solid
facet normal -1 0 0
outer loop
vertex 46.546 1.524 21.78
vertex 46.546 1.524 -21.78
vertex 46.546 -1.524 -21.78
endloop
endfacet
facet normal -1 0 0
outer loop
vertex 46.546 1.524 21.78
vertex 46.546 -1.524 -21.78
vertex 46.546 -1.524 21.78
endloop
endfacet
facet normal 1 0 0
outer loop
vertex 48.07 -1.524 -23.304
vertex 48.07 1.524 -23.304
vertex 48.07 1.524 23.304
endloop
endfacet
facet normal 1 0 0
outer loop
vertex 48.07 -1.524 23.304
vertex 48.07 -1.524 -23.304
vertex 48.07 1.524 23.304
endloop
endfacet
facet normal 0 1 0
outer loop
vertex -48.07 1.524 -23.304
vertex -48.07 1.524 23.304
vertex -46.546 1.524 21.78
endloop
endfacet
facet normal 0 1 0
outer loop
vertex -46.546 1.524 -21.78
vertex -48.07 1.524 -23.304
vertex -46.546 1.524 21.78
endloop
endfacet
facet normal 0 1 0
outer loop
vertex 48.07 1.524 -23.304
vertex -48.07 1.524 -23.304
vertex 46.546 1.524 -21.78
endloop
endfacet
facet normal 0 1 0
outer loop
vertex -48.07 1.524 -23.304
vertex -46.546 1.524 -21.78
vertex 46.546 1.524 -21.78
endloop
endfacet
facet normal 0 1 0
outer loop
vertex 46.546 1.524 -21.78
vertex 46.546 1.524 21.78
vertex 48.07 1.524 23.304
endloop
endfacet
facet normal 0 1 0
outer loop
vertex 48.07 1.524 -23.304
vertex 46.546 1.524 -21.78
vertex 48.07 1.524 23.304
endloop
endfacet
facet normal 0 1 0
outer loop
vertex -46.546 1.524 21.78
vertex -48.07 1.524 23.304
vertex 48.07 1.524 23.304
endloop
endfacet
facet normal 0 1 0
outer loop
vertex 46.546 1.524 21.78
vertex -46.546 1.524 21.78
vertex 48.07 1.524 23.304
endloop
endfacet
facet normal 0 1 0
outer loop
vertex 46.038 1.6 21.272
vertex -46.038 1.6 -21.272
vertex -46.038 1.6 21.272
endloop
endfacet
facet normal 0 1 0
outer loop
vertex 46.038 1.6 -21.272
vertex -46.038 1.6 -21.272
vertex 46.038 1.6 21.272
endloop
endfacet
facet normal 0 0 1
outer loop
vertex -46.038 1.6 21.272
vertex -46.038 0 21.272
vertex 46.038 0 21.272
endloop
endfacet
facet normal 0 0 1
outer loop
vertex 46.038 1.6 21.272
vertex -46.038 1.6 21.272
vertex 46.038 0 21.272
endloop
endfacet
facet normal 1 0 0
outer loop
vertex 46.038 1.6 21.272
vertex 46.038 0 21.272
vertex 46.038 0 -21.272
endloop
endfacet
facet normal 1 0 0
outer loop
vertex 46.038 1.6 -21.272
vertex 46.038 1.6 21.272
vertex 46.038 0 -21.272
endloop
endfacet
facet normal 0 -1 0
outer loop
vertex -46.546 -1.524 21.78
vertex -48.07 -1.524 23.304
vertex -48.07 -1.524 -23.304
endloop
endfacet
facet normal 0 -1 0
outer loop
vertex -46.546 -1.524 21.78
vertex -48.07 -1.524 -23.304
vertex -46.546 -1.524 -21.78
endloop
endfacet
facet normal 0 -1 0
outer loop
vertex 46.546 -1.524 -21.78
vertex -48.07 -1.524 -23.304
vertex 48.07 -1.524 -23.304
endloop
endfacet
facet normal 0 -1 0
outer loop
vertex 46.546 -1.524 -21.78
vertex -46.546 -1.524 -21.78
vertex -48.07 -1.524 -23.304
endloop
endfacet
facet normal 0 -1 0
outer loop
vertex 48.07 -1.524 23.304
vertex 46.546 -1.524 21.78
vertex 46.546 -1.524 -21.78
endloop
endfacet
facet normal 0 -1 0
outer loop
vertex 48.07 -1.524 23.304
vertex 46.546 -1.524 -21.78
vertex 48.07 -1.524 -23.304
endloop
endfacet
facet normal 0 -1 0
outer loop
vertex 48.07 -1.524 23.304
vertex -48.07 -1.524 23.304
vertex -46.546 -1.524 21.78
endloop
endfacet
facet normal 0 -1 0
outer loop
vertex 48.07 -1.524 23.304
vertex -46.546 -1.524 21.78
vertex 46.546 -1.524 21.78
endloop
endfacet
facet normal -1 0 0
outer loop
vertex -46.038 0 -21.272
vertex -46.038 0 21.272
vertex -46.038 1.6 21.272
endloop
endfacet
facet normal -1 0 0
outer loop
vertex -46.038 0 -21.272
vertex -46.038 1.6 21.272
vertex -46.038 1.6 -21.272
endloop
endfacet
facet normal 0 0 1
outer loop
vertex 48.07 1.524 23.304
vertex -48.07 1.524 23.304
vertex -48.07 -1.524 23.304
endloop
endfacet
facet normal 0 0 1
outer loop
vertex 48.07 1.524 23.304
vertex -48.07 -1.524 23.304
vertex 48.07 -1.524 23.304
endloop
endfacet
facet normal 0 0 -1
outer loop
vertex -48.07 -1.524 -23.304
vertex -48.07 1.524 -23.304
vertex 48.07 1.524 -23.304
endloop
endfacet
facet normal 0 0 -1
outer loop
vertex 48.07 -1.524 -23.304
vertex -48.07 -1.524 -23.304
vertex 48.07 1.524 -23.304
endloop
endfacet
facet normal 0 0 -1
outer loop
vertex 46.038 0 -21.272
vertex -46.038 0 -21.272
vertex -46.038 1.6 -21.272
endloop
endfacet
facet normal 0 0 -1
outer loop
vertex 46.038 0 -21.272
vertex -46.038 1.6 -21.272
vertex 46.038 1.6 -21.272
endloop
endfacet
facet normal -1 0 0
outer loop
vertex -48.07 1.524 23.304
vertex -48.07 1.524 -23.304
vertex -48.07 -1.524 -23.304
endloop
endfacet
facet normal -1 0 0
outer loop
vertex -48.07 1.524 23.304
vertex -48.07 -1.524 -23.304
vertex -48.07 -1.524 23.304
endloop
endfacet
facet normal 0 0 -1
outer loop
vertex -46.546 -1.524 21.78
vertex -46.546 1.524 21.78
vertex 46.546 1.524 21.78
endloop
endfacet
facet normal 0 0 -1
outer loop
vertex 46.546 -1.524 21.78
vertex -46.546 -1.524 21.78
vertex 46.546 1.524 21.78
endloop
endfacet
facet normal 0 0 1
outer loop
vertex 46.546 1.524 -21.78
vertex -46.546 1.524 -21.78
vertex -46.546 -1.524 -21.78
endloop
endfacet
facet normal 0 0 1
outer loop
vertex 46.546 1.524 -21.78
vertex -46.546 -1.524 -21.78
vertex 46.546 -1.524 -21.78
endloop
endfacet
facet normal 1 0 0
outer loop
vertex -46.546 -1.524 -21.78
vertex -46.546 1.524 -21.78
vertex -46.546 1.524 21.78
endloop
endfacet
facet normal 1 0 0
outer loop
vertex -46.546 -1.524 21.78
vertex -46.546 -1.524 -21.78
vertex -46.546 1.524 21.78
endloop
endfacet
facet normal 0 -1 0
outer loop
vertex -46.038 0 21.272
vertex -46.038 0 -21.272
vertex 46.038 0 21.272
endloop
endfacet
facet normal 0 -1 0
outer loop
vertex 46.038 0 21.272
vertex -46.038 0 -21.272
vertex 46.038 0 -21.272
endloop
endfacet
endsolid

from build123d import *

# Parameters (mm, degrees)
SKETCH1_W                = 92.075
SKETCH1_H                = 42.545
BOSS_EXTRUDE2_DEPTH      = 1.6
BOSS_EXTRUDE4_DEPTH      = 1.524
BOSS_EXTRUDE4_DEPTH_BACK = 1.524
SKETCH2_W                = 96.139
SKETCH2_H                = 46.609
SKETCH2_W_2              = 93.091
SKETCH2_H_2              = 43.561


with BuildPart() as part:
    # Sketch1 → Boss-Extrude2 (new body)
    with BuildSketch(Plane(origin=(0, 0, 0), x_dir=(1, 0, 0), z_dir=(0, 1, 0))):
        Rectangle(SKETCH1_W, SKETCH1_H)
    extrude(amount=BOSS_EXTRUDE2_DEPTH)


with BuildPart() as body_2:
    # Sketch2 → Boss-Extrude4 (new, two sides: drawn at the far end of the back side and taken through both)
    with BuildSketch(Plane.XZ.offset(-BOSS_EXTRUDE4_DEPTH_BACK)):
        Rectangle(SKETCH2_W, SKETCH2_H)
        Rectangle(SKETCH2_W_2, SKETCH2_H_2, mode=Mode.SUBTRACT)
    extrude(amount=BOSS_EXTRUDE4_DEPTH + BOSS_EXTRUDE4_DEPTH_BACK)


solid = Compound([part.part, body_2.part])
